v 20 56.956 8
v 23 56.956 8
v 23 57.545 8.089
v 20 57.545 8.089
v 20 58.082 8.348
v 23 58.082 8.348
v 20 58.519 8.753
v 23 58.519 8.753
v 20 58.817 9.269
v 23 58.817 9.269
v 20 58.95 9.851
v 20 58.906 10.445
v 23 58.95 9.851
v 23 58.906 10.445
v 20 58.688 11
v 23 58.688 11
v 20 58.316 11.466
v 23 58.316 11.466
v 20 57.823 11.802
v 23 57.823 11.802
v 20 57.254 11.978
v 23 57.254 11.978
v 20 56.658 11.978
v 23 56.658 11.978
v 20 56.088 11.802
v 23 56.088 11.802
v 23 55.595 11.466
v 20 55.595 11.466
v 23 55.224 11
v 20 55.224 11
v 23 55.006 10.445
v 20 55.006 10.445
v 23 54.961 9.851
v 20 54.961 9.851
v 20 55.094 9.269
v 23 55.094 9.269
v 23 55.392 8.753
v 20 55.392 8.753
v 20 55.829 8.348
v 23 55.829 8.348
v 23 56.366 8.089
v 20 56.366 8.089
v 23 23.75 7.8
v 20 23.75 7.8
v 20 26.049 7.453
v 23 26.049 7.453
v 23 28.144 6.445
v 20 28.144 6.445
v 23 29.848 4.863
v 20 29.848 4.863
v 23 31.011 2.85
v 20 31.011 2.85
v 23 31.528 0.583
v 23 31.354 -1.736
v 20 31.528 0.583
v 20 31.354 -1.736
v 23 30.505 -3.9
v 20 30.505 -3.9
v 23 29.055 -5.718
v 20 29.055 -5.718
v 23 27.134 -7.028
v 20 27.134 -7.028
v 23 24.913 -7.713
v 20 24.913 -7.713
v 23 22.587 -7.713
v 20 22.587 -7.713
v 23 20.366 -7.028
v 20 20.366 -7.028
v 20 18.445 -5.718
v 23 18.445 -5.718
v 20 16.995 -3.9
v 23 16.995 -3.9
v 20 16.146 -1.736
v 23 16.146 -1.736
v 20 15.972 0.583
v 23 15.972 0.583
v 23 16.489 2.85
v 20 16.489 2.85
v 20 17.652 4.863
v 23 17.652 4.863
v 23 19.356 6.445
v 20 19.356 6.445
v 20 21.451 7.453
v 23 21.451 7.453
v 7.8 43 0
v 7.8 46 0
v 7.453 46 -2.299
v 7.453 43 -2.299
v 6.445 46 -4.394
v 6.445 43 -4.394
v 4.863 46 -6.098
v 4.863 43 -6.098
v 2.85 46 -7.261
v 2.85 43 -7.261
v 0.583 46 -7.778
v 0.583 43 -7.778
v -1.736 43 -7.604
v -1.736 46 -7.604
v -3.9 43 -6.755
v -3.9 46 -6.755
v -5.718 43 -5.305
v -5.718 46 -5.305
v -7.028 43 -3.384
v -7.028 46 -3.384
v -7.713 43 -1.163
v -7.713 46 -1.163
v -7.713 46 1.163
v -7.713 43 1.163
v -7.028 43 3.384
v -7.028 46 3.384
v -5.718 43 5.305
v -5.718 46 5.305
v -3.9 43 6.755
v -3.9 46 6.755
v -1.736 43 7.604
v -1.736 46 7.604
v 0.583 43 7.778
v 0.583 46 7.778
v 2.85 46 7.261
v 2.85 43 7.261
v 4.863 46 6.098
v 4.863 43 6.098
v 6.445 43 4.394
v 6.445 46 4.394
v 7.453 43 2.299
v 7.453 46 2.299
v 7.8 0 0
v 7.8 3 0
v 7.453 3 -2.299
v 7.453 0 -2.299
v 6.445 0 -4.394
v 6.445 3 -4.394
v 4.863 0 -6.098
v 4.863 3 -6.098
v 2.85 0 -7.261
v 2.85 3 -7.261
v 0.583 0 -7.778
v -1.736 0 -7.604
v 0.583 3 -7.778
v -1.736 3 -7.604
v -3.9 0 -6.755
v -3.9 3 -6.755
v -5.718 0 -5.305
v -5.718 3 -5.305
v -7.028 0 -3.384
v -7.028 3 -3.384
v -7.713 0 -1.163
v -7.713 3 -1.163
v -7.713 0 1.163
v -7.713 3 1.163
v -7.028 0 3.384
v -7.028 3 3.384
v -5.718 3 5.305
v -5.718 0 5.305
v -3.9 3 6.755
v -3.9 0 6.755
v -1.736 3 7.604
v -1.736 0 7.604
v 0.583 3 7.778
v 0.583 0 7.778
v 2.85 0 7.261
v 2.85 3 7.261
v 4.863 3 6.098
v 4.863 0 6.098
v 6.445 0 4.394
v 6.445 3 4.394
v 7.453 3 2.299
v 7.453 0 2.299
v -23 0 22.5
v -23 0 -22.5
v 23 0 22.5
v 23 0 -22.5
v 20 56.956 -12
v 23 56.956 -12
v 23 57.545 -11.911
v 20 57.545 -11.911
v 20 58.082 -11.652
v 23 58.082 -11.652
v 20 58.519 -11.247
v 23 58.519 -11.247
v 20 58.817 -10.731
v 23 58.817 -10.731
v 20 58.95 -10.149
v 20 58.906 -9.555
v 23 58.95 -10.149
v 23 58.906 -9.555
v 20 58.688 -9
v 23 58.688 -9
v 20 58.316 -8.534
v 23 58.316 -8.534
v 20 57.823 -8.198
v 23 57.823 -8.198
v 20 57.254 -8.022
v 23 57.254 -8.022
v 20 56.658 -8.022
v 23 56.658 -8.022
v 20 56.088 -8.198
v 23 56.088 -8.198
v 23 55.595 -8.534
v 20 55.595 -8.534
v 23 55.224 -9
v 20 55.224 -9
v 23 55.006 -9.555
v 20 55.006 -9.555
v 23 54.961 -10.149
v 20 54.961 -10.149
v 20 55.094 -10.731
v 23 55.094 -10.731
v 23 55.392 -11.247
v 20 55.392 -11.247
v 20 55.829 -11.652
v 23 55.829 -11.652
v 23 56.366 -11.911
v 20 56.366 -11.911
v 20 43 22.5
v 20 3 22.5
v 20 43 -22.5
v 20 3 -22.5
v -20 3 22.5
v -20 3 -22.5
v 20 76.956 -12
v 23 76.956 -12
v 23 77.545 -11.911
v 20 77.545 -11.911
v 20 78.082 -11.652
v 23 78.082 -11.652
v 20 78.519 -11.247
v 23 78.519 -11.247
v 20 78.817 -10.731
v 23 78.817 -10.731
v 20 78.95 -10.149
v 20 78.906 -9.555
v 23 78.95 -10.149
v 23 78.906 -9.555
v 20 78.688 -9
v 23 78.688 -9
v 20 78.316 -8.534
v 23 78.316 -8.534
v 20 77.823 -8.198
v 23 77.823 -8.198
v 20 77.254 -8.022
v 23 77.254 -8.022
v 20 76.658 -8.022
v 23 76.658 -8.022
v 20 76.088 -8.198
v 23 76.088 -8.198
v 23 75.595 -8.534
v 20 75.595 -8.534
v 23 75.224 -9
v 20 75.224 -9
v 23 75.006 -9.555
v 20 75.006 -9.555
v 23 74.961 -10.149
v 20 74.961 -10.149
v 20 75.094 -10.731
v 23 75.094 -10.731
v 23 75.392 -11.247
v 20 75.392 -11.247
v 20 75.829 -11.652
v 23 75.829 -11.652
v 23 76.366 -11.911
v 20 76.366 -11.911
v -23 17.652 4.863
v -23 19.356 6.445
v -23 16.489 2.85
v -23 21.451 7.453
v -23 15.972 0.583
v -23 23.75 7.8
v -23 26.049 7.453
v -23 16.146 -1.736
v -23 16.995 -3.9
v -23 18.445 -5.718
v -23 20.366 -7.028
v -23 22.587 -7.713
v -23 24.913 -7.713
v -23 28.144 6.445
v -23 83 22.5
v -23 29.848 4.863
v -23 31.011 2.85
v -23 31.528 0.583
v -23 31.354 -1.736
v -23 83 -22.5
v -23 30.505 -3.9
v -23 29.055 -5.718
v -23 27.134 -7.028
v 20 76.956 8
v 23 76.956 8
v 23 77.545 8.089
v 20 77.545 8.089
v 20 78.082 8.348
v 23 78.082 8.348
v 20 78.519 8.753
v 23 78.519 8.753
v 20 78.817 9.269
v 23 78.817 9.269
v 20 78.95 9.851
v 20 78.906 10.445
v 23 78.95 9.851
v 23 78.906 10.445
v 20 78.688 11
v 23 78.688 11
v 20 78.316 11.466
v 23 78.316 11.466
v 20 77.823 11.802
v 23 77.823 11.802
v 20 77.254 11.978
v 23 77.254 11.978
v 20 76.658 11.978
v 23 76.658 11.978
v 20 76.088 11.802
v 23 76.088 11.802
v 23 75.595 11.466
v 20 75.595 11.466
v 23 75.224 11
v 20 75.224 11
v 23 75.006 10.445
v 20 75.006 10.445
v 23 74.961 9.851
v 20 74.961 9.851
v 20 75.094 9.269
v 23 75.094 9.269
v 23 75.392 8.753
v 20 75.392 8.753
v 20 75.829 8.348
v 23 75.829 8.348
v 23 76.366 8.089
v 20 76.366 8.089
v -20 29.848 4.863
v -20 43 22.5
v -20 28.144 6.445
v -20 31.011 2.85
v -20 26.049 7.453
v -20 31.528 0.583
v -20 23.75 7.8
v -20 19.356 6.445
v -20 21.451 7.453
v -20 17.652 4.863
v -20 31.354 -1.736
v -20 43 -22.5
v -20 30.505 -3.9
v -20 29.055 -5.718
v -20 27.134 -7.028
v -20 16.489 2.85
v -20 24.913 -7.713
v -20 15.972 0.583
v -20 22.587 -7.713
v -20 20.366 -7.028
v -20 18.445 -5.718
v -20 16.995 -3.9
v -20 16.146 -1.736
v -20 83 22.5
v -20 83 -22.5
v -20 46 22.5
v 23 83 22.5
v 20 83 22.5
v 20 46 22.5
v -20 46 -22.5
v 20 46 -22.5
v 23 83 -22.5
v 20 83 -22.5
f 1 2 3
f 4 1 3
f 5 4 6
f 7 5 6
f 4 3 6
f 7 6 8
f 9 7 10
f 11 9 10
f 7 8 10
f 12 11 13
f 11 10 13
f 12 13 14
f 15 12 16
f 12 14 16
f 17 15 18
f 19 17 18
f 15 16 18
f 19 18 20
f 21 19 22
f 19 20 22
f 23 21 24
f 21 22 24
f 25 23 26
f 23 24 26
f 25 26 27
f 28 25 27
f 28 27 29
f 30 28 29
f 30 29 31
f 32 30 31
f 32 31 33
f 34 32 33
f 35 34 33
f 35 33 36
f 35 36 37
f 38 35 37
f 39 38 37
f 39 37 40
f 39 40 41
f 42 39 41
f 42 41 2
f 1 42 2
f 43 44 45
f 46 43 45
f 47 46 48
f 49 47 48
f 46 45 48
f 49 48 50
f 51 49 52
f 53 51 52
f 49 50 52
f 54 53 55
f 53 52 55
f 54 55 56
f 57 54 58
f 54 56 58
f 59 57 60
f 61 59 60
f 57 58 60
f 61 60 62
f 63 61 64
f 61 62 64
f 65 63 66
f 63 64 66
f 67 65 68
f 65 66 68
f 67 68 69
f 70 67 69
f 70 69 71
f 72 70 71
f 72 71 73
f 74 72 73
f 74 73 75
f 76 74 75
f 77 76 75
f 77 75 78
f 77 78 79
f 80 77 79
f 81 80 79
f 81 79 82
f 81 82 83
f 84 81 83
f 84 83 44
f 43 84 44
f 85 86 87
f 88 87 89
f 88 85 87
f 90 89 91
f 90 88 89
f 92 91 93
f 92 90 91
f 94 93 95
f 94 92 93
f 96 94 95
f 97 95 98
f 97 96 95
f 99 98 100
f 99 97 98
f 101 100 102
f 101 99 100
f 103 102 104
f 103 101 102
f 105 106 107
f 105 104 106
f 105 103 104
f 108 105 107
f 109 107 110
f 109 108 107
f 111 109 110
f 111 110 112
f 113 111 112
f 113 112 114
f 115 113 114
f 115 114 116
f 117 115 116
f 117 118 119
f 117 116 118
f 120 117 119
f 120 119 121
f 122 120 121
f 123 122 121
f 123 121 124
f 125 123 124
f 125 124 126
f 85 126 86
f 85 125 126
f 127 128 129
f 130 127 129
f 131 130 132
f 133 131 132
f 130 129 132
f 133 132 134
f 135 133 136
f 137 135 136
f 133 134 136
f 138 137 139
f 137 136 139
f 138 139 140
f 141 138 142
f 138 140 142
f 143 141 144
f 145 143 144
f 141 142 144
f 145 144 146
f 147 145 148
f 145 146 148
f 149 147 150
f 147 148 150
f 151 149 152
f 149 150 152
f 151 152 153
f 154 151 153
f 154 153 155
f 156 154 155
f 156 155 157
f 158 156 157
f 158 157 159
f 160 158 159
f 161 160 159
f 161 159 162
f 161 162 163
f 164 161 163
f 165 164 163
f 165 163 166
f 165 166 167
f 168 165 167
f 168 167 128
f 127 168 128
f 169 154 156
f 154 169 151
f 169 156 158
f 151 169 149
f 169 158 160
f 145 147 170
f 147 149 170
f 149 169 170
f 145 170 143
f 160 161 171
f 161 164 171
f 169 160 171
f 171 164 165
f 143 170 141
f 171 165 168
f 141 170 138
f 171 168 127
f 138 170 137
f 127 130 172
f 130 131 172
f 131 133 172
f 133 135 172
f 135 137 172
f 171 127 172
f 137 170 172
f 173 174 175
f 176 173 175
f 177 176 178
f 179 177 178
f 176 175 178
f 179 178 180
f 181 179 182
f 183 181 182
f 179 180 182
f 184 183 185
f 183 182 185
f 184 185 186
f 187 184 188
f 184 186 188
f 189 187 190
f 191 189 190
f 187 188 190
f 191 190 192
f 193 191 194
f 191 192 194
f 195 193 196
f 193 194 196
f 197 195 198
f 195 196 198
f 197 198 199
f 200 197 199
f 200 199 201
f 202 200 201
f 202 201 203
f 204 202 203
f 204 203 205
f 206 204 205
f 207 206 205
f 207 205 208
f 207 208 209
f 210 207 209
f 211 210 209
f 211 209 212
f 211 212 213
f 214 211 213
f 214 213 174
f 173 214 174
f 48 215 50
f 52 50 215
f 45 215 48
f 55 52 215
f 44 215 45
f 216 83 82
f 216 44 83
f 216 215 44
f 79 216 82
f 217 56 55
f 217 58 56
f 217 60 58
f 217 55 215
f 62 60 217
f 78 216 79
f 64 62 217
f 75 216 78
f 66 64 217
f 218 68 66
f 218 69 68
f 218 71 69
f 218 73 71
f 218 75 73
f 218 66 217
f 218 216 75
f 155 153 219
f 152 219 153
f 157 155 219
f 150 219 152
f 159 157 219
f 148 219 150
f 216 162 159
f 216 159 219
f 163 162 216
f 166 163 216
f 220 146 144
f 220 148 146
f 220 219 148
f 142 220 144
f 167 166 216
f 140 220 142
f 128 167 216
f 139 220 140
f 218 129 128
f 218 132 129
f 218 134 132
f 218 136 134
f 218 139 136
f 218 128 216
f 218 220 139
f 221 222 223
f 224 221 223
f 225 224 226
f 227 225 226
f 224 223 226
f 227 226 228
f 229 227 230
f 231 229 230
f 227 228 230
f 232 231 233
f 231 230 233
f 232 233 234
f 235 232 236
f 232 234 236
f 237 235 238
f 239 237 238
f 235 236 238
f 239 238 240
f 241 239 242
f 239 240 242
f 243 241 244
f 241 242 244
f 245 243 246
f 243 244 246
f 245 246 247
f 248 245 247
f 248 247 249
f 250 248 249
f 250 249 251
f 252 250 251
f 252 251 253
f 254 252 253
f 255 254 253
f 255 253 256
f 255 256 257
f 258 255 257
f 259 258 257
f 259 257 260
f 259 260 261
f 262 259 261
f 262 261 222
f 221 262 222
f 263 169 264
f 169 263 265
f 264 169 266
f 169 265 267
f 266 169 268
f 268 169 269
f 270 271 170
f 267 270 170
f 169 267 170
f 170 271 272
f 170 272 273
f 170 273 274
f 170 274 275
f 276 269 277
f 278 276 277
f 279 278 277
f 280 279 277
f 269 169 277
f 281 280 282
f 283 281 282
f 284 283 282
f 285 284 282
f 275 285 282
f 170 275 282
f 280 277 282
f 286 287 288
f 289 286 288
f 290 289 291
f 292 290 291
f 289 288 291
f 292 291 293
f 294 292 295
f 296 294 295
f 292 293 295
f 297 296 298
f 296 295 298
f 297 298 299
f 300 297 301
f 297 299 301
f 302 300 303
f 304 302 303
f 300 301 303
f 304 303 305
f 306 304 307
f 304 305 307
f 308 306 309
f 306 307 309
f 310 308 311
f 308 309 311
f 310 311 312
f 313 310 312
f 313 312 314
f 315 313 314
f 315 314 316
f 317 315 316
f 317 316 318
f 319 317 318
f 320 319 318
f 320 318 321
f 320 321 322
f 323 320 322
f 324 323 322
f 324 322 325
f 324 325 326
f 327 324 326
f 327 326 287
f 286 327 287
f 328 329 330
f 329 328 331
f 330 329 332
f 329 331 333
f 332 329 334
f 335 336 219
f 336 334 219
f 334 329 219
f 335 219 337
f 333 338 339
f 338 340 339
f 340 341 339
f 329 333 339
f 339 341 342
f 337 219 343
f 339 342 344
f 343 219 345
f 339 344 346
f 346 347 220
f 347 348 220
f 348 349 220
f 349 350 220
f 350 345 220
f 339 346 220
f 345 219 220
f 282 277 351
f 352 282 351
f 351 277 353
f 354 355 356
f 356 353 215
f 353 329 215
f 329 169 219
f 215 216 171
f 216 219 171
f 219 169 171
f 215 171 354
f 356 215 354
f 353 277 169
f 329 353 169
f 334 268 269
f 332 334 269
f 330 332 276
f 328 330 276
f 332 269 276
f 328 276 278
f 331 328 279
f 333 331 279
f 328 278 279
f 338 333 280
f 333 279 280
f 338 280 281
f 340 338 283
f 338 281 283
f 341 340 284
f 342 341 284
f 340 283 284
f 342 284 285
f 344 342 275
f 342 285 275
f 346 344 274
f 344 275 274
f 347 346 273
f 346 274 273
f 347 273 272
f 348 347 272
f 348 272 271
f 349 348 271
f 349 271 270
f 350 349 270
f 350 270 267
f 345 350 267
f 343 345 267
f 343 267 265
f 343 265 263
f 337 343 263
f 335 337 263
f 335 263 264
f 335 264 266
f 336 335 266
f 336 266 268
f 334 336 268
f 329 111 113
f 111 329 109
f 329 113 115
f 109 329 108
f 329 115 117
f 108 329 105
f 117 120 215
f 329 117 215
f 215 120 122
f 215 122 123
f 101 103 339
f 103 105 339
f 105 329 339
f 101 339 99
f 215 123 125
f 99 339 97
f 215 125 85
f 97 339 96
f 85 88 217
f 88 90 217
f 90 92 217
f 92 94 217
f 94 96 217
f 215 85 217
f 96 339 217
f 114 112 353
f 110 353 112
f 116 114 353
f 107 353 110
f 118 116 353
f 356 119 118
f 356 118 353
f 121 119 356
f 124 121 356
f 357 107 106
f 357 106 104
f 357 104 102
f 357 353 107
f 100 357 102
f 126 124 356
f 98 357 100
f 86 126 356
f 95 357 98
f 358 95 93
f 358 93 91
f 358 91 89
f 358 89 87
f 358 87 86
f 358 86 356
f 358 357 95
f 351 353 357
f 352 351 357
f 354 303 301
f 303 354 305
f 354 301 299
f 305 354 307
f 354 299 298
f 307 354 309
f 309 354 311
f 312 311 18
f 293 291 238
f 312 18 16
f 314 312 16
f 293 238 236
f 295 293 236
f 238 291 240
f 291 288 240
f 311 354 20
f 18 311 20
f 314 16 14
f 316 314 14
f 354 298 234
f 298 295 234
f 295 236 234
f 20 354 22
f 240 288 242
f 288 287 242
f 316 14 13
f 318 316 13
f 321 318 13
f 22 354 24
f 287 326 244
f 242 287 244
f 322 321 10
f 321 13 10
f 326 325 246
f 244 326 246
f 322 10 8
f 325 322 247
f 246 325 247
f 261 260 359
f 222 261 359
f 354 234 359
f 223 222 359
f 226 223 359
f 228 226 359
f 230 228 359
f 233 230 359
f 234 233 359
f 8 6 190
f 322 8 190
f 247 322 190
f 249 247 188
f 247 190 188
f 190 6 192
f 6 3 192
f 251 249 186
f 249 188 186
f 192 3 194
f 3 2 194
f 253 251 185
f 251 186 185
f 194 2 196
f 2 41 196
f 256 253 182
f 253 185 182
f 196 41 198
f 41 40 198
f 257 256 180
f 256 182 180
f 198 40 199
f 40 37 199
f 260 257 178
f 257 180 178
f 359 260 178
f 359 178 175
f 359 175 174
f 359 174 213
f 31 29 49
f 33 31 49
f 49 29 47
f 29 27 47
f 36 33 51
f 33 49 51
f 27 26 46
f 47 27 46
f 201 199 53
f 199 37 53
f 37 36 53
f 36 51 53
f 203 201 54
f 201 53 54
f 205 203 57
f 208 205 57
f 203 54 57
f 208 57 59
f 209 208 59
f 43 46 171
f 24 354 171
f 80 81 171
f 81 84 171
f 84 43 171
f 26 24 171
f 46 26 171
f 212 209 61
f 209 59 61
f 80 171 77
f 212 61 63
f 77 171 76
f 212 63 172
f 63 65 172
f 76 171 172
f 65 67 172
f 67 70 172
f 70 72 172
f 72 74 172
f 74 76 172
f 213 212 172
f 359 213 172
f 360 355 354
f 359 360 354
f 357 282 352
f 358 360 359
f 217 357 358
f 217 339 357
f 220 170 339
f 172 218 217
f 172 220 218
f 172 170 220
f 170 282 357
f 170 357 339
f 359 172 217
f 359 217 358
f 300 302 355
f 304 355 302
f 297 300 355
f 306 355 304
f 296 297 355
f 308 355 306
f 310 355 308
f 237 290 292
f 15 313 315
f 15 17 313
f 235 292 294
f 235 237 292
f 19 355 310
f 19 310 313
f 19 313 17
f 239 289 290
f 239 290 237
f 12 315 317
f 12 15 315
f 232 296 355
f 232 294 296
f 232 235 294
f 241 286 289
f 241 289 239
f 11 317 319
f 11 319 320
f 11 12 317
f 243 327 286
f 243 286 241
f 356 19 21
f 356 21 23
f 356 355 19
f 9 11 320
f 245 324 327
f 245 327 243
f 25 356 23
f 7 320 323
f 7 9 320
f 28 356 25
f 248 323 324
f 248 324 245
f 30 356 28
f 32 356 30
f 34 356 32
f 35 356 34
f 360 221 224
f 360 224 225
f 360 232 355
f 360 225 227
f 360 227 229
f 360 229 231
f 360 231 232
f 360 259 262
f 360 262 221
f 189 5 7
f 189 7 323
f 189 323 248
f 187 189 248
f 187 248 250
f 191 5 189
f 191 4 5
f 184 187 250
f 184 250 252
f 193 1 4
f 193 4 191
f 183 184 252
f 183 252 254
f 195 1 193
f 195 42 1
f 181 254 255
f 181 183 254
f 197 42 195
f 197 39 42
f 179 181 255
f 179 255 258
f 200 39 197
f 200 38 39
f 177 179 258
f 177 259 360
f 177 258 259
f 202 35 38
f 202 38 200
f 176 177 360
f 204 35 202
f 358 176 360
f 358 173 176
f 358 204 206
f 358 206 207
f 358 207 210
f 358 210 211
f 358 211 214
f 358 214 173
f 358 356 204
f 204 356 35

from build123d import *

# Parameters (mm, degrees)
SKETCH1_W           = 46
SKETCH1_H           = 45
BOSS_EXTRUDE1_DEPTH = 3
SKETCH5_W           = 3
SKETCH5_H           = 45
BOSS_EXTRUDE3_DEPTH = 35
SKETCH9_R           = 7.8
CUT_EXTRUDE5_DEPTH  = 10
SKETCH11_R          = 7.8
CUT_EXTRUDE8_DEPTH  = 47
SKETCH12_W          = 3
SKETCH12_H          = 45
BOSS_EXTRUDE4_DEPTH = 45
SKETCH13_R          = 2
CUT_EXTRUDE9_DEPTH  = 10


with BuildPart() as part:
    # Sketch1 → Boss-Extrude1 (new body)
    with BuildSketch(Plane(origin=(0, 0, 0), x_dir=(1, 0, 0), z_dir=(0, 1, 0))):
        Rectangle(SKETCH1_W, SKETCH1_H)
    boss_extrude1 = extrude(amount=BOSS_EXTRUDE1_DEPTH)

    # Sketch5 → Boss-Extrude3 (add)
    with BuildSketch(Plane(origin=(0, 3, 0), x_dir=(1, 0, 0), z_dir=(0, 1, 0))):
        with Locations((21.5, 0)):
            Rectangle(SKETCH5_W, SKETCH5_H)
        with Locations((-21.5, 0)):
            Rectangle(SKETCH5_W, SKETCH5_H)
    extrude(amount=BOSS_EXTRUDE3_DEPTH)

    # Sketch9 → Cut-Extrude5 (cut)
    with BuildSketch(Plane(origin=(0, 3, 0), x_dir=(1, 0, 0), z_dir=(0, 1, 0))):
        Circle(SKETCH9_R)
    cut_extrude5 = extrude(amount=-CUT_EXTRUDE5_DEPTH, mode=Mode.SUBTRACT)

    # Sketch11 → Cut-Extrude8 (cut, through all)
    with BuildSketch(Plane.ZY.offset(23)):
        with Locations((0, 23.75)):
            Circle(SKETCH11_R)
    extrude(amount=-CUT_EXTRUDE8_DEPTH, mode=Mode.SUBTRACT)

    # Sketch12 → Boss-Extrude4 (add)
    with BuildSketch(Plane(origin=(0, 38, 0), x_dir=(1, 0, 0), z_dir=(0, 1, 0))):
        with Locations((-21.5, 0)):
            Rectangle(SKETCH12_W, SKETCH12_H)
        with Locations((21.5, 0)):
            Rectangle(SKETCH12_W, SKETCH12_H)
    extrude(amount=BOSS_EXTRUDE4_DEPTH)

    # Sketch13 → Cut-Extrude9 (cut)
    with BuildSketch(Plane(origin=(23, 0, 0), x_dir=(0, 0, -1), z_dir=(1, 0, 0))):
        with Locations((-10, 76.955662999)):
            Circle(SKETCH13_R)
        with Locations((10, 76.955662999)):
            Circle(SKETCH13_R)
        with Locations((10, 56.955662999)):
            Circle(SKETCH13_R)
        with Locations((-10, 56.955662999)):
            Circle(SKETCH13_R)
    extrude(amount=-CUT_EXTRUDE9_DEPTH, mode=Mode.SUBTRACT)

    # Mirror1: Boss-Extrude1, Cut-Extrude5 across plane
    add(boss_extrude1.mirror(Plane.ZX.offset(23)))
    add(cut_extrude5.mirror(Plane.ZX.offset(23)), mode=Mode.SUBTRACT)


solid = part.part
